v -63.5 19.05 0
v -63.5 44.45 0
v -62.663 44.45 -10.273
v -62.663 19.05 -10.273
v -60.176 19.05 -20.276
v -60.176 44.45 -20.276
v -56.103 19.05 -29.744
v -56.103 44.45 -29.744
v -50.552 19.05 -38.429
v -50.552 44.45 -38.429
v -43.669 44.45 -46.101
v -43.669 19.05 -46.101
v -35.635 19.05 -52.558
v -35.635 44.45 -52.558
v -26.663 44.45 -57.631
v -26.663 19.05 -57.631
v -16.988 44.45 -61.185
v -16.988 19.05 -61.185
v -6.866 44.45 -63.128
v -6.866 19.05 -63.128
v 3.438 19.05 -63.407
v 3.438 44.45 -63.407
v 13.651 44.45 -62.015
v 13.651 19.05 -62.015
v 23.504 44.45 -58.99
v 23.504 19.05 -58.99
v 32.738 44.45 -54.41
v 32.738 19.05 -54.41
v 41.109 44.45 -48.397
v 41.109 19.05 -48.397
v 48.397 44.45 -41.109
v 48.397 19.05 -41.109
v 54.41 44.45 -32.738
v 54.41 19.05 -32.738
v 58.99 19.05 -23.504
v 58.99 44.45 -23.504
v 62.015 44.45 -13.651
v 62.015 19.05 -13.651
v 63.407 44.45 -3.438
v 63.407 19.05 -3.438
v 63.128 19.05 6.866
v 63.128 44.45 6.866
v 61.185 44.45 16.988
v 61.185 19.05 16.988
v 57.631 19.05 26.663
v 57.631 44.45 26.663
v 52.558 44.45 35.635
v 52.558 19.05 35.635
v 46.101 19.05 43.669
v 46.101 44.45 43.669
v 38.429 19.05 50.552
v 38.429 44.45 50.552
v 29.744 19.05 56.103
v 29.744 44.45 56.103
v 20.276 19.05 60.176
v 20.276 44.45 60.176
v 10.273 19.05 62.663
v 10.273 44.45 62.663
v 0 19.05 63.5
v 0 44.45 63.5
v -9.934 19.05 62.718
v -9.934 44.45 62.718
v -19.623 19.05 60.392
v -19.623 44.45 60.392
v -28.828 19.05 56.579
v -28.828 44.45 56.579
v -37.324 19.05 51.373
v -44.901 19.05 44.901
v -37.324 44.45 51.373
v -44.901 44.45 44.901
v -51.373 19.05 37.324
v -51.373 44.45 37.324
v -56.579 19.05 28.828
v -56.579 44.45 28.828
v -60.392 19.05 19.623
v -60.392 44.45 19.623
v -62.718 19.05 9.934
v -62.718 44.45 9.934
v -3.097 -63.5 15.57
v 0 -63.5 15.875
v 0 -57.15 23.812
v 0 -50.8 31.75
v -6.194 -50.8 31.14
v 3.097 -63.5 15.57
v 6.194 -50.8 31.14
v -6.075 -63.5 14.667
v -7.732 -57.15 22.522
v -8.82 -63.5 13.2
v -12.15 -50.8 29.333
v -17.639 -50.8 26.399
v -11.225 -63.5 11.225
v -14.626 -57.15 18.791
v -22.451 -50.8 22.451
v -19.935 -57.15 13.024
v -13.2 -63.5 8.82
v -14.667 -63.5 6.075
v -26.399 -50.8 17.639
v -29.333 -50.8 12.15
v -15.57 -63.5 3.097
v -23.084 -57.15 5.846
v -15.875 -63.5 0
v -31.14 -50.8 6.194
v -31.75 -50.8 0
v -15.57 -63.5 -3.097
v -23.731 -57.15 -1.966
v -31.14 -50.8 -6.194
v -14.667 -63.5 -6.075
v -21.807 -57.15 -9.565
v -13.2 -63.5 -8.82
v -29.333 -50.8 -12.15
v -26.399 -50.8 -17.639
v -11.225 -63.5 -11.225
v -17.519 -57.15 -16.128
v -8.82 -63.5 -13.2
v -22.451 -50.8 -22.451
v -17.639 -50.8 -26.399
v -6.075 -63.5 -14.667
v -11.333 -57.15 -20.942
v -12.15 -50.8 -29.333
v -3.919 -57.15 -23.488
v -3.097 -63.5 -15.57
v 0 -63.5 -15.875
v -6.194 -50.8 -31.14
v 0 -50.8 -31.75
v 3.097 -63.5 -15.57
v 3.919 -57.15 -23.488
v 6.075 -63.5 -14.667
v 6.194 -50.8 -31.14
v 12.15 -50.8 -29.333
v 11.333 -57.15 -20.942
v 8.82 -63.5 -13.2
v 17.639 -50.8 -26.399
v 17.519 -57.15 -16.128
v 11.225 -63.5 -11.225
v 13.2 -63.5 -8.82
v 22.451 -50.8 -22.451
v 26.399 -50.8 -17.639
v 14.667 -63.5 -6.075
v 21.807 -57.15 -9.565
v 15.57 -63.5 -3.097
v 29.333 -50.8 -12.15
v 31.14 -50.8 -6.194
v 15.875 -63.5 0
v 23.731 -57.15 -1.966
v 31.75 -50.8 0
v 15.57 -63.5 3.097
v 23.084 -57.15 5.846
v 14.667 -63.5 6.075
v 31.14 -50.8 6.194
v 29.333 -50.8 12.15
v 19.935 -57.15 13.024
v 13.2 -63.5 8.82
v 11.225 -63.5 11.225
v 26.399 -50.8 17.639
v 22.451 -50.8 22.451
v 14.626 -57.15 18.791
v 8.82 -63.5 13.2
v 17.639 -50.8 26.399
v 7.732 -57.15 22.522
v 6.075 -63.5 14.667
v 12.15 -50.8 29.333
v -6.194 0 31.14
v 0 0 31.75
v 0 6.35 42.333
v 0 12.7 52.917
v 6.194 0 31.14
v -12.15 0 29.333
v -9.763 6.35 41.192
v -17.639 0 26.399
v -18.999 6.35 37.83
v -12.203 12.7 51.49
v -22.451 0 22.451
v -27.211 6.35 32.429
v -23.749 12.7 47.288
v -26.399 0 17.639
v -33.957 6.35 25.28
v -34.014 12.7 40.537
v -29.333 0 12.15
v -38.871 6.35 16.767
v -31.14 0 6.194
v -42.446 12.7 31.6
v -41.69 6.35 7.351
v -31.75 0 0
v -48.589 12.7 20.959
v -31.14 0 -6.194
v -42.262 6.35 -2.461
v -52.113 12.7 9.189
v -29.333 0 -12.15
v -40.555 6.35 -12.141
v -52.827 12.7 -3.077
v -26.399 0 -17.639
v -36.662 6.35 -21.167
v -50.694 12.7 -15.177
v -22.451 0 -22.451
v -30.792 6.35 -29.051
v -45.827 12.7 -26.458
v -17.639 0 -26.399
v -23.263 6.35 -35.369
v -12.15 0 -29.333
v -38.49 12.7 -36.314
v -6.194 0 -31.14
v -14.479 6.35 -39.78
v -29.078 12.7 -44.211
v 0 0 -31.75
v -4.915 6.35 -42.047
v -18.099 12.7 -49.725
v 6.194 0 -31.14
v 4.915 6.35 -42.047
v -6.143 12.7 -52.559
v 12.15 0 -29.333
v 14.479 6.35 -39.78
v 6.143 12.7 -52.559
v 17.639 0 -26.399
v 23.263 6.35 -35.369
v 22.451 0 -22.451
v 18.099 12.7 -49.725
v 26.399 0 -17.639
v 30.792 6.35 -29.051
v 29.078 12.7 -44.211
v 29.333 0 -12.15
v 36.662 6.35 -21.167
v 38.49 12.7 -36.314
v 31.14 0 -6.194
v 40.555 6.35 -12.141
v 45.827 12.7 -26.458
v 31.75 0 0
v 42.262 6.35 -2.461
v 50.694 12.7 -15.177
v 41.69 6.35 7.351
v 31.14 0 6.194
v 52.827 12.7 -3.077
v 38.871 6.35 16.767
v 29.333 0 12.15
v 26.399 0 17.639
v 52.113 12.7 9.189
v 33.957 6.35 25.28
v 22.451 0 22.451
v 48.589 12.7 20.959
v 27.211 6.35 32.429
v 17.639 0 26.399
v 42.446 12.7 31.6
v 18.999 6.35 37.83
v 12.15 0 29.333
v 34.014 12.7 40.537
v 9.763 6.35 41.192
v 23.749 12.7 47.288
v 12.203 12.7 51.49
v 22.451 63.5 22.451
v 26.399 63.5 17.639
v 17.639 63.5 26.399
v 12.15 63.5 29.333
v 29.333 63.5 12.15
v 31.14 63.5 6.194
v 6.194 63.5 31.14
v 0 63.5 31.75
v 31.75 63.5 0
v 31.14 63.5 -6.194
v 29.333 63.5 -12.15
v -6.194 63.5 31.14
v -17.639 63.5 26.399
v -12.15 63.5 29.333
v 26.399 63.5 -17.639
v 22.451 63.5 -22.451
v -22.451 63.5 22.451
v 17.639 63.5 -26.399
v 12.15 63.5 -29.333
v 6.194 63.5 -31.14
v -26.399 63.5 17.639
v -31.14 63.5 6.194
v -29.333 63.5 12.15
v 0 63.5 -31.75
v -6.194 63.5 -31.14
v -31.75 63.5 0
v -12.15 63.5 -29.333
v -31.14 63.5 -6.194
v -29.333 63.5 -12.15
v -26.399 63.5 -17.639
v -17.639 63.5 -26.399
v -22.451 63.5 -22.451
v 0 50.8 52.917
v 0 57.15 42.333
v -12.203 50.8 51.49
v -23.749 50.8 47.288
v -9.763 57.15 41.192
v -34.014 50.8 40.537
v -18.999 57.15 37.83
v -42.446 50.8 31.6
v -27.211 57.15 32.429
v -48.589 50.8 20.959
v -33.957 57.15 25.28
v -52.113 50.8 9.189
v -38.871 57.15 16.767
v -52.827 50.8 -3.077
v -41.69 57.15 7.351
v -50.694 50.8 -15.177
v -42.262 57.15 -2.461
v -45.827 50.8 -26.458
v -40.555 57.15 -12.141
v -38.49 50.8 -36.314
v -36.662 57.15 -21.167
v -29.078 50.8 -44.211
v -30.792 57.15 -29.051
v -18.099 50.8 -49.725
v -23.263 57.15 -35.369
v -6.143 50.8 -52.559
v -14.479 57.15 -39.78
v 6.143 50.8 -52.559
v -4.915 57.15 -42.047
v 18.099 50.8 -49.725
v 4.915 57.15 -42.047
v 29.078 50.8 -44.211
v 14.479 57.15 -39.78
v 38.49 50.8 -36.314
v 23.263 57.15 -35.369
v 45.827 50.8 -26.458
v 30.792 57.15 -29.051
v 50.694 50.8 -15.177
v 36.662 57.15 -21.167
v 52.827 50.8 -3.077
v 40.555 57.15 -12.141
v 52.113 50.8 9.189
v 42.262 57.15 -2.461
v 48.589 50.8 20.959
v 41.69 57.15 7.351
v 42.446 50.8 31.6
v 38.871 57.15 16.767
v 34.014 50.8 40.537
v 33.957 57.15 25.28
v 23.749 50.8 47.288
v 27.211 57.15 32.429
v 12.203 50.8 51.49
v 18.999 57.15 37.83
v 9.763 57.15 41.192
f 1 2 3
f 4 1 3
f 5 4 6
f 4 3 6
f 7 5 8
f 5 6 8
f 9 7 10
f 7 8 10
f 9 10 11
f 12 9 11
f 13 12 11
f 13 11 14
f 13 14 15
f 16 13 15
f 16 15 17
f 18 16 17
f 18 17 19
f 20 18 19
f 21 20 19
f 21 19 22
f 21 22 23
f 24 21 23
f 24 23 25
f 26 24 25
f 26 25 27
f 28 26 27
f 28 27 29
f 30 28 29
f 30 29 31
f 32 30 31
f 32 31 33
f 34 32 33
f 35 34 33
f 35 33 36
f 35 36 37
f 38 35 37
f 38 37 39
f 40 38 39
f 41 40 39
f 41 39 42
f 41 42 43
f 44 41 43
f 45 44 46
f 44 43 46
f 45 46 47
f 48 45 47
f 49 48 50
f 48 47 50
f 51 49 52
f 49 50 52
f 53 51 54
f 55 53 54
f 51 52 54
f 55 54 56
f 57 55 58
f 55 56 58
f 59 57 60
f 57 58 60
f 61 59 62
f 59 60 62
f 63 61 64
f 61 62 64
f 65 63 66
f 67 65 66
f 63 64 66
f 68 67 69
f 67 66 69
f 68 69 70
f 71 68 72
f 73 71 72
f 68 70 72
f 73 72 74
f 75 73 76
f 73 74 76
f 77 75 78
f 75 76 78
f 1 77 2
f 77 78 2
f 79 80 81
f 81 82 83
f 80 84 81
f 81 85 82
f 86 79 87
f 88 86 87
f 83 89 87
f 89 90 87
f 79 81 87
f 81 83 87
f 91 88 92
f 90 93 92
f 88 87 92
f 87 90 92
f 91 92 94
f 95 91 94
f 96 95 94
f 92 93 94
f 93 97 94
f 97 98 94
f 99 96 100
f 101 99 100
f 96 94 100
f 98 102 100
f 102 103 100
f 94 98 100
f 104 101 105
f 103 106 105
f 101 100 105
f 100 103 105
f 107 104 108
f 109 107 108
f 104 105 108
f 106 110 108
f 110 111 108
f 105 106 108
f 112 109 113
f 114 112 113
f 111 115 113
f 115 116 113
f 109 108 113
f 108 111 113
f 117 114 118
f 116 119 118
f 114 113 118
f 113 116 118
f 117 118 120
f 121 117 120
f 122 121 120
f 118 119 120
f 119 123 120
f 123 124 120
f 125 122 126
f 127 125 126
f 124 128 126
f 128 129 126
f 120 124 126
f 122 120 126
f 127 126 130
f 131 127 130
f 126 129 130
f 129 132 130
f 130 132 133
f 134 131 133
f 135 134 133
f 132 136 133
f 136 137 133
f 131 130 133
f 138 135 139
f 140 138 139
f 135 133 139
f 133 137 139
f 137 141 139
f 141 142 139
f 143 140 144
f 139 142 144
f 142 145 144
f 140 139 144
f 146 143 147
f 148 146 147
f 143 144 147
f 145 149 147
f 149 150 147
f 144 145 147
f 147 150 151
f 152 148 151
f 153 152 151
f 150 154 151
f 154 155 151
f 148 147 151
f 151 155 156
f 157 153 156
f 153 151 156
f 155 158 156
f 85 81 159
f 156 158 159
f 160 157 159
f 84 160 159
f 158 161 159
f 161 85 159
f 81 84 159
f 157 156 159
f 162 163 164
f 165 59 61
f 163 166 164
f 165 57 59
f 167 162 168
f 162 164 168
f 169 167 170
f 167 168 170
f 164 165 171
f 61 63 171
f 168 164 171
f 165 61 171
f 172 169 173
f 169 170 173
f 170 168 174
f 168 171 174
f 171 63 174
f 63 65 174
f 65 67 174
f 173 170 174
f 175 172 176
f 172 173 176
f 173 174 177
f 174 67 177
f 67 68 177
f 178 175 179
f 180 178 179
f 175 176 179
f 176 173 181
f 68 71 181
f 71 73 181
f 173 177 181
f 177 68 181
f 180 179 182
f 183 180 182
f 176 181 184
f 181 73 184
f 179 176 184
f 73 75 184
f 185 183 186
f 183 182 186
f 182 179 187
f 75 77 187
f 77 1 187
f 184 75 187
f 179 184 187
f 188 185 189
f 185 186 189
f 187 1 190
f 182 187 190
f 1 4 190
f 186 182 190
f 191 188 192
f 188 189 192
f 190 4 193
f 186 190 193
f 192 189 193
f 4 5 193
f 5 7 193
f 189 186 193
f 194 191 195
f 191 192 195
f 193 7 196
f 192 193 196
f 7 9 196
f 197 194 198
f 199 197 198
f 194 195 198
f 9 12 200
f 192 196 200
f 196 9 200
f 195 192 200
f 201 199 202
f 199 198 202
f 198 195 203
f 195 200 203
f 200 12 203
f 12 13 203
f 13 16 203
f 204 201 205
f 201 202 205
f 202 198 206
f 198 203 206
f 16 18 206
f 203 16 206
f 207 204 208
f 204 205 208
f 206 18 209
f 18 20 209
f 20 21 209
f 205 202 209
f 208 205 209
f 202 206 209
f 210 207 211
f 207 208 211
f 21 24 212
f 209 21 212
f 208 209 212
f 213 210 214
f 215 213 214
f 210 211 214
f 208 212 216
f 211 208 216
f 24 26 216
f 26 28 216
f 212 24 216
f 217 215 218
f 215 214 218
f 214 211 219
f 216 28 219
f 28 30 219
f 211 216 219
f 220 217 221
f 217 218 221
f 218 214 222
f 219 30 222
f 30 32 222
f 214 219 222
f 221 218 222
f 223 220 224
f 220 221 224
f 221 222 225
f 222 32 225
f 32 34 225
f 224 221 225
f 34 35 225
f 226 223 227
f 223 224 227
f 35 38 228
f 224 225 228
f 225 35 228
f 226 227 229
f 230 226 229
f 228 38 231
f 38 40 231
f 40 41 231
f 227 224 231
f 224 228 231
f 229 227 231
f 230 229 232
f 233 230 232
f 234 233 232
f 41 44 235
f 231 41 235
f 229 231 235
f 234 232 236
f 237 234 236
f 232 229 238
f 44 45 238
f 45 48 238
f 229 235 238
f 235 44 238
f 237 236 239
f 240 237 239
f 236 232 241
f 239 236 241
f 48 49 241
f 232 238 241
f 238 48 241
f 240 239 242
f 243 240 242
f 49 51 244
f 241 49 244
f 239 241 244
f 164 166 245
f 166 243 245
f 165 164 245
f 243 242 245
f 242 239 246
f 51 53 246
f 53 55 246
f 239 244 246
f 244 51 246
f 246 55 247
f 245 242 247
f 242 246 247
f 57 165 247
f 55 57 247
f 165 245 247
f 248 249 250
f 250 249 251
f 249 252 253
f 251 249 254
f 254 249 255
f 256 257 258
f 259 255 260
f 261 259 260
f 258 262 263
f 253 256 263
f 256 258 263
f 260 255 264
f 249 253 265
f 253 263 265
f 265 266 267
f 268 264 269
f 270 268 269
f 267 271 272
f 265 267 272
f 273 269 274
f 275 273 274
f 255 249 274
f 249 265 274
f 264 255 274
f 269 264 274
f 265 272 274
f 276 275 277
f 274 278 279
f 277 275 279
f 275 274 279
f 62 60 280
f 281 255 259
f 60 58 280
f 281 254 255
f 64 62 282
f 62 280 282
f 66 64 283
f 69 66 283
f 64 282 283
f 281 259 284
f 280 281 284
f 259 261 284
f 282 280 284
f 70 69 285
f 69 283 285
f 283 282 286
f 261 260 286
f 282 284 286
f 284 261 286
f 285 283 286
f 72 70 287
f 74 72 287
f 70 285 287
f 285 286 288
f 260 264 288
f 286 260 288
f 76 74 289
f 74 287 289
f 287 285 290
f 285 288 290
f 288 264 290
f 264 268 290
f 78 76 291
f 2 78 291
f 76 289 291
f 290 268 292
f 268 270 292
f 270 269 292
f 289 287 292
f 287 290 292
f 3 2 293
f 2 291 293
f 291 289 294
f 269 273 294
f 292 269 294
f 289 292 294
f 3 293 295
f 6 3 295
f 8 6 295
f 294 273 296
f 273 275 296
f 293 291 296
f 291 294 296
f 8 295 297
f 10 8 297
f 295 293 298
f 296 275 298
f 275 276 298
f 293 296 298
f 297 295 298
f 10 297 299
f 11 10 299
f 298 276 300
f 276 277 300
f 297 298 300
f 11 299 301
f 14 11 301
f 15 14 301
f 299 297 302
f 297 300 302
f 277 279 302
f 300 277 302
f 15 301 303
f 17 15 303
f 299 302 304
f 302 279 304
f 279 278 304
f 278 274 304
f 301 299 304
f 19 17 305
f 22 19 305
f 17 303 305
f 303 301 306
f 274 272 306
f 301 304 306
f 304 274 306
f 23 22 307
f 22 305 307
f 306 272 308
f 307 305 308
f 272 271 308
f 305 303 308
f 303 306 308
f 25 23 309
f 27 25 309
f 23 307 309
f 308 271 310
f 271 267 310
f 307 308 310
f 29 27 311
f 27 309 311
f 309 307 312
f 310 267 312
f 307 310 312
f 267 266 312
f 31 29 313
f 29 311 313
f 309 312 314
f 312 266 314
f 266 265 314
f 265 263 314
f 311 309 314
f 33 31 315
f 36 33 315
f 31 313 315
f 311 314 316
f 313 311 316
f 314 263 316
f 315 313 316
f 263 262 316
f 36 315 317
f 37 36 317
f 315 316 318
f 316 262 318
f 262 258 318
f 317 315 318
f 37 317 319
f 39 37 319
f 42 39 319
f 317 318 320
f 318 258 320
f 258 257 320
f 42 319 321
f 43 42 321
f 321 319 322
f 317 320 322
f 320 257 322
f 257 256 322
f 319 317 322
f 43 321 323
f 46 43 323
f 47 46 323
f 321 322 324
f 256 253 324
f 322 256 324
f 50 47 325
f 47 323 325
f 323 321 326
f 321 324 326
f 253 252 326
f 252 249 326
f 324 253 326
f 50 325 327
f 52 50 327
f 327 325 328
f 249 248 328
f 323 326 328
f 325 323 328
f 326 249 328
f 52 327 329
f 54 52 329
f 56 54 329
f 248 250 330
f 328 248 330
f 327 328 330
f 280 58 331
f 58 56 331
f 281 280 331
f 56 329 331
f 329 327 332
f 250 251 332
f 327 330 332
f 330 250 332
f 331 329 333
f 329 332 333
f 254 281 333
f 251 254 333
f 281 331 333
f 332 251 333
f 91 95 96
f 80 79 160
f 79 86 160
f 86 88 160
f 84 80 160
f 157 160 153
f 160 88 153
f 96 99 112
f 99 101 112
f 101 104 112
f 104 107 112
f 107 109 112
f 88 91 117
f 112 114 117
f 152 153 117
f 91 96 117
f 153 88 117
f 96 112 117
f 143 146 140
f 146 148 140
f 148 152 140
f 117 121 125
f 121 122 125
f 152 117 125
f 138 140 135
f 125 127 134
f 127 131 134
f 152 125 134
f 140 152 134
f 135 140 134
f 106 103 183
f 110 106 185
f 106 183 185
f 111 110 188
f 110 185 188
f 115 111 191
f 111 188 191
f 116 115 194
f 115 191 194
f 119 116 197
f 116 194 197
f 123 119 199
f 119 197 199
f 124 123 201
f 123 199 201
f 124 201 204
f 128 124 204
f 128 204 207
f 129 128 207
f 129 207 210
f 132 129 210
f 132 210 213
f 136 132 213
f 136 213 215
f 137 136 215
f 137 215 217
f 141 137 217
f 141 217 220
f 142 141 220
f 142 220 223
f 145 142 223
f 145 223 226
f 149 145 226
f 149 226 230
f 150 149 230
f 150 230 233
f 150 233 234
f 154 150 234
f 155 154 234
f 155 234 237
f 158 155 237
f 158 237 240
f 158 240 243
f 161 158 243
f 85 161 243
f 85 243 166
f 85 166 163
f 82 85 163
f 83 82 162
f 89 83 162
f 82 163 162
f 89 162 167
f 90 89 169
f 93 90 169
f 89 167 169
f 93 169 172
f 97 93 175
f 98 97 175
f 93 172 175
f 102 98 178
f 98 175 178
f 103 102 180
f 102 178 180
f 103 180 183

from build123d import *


with BuildPart() as part:
    # Sketch1 → Revolve1 (revolve)
    with BuildSketch(Plane.XY):
        Polygon((0, 63.5), (0, -63.5), (-31.75, -63.5), (-31.75, 0), (-63.5, 0), (-63.5, 63.5), align=None)
    revolve(axis=Axis((0, 63.5, 0), (0, -1, 0)))

    # Sketch3 → Cut-Revolve1 (revolve, cut)
    with BuildSketch(Plane(origin=(0, 0, 0), x_dir=(0, 0, -1), z_dir=(1, 0, 0))):
        Polygon((-63.5, 44.45), (-31.75, 63.5), (-63.5, 63.5), align=None)
        Polygon((-63.5, 19.05), (-63.5, 0), (-31.75, 0), align=None)
        Polygon((-15.875, -63.5), (-31.75, -50.8), (-31.75, -63.5), align=None)
    revolve(axis=Axis((0, 63.5, 0), (0, -1, 0)), mode=Mode.SUBTRACT)


solid = part.part
